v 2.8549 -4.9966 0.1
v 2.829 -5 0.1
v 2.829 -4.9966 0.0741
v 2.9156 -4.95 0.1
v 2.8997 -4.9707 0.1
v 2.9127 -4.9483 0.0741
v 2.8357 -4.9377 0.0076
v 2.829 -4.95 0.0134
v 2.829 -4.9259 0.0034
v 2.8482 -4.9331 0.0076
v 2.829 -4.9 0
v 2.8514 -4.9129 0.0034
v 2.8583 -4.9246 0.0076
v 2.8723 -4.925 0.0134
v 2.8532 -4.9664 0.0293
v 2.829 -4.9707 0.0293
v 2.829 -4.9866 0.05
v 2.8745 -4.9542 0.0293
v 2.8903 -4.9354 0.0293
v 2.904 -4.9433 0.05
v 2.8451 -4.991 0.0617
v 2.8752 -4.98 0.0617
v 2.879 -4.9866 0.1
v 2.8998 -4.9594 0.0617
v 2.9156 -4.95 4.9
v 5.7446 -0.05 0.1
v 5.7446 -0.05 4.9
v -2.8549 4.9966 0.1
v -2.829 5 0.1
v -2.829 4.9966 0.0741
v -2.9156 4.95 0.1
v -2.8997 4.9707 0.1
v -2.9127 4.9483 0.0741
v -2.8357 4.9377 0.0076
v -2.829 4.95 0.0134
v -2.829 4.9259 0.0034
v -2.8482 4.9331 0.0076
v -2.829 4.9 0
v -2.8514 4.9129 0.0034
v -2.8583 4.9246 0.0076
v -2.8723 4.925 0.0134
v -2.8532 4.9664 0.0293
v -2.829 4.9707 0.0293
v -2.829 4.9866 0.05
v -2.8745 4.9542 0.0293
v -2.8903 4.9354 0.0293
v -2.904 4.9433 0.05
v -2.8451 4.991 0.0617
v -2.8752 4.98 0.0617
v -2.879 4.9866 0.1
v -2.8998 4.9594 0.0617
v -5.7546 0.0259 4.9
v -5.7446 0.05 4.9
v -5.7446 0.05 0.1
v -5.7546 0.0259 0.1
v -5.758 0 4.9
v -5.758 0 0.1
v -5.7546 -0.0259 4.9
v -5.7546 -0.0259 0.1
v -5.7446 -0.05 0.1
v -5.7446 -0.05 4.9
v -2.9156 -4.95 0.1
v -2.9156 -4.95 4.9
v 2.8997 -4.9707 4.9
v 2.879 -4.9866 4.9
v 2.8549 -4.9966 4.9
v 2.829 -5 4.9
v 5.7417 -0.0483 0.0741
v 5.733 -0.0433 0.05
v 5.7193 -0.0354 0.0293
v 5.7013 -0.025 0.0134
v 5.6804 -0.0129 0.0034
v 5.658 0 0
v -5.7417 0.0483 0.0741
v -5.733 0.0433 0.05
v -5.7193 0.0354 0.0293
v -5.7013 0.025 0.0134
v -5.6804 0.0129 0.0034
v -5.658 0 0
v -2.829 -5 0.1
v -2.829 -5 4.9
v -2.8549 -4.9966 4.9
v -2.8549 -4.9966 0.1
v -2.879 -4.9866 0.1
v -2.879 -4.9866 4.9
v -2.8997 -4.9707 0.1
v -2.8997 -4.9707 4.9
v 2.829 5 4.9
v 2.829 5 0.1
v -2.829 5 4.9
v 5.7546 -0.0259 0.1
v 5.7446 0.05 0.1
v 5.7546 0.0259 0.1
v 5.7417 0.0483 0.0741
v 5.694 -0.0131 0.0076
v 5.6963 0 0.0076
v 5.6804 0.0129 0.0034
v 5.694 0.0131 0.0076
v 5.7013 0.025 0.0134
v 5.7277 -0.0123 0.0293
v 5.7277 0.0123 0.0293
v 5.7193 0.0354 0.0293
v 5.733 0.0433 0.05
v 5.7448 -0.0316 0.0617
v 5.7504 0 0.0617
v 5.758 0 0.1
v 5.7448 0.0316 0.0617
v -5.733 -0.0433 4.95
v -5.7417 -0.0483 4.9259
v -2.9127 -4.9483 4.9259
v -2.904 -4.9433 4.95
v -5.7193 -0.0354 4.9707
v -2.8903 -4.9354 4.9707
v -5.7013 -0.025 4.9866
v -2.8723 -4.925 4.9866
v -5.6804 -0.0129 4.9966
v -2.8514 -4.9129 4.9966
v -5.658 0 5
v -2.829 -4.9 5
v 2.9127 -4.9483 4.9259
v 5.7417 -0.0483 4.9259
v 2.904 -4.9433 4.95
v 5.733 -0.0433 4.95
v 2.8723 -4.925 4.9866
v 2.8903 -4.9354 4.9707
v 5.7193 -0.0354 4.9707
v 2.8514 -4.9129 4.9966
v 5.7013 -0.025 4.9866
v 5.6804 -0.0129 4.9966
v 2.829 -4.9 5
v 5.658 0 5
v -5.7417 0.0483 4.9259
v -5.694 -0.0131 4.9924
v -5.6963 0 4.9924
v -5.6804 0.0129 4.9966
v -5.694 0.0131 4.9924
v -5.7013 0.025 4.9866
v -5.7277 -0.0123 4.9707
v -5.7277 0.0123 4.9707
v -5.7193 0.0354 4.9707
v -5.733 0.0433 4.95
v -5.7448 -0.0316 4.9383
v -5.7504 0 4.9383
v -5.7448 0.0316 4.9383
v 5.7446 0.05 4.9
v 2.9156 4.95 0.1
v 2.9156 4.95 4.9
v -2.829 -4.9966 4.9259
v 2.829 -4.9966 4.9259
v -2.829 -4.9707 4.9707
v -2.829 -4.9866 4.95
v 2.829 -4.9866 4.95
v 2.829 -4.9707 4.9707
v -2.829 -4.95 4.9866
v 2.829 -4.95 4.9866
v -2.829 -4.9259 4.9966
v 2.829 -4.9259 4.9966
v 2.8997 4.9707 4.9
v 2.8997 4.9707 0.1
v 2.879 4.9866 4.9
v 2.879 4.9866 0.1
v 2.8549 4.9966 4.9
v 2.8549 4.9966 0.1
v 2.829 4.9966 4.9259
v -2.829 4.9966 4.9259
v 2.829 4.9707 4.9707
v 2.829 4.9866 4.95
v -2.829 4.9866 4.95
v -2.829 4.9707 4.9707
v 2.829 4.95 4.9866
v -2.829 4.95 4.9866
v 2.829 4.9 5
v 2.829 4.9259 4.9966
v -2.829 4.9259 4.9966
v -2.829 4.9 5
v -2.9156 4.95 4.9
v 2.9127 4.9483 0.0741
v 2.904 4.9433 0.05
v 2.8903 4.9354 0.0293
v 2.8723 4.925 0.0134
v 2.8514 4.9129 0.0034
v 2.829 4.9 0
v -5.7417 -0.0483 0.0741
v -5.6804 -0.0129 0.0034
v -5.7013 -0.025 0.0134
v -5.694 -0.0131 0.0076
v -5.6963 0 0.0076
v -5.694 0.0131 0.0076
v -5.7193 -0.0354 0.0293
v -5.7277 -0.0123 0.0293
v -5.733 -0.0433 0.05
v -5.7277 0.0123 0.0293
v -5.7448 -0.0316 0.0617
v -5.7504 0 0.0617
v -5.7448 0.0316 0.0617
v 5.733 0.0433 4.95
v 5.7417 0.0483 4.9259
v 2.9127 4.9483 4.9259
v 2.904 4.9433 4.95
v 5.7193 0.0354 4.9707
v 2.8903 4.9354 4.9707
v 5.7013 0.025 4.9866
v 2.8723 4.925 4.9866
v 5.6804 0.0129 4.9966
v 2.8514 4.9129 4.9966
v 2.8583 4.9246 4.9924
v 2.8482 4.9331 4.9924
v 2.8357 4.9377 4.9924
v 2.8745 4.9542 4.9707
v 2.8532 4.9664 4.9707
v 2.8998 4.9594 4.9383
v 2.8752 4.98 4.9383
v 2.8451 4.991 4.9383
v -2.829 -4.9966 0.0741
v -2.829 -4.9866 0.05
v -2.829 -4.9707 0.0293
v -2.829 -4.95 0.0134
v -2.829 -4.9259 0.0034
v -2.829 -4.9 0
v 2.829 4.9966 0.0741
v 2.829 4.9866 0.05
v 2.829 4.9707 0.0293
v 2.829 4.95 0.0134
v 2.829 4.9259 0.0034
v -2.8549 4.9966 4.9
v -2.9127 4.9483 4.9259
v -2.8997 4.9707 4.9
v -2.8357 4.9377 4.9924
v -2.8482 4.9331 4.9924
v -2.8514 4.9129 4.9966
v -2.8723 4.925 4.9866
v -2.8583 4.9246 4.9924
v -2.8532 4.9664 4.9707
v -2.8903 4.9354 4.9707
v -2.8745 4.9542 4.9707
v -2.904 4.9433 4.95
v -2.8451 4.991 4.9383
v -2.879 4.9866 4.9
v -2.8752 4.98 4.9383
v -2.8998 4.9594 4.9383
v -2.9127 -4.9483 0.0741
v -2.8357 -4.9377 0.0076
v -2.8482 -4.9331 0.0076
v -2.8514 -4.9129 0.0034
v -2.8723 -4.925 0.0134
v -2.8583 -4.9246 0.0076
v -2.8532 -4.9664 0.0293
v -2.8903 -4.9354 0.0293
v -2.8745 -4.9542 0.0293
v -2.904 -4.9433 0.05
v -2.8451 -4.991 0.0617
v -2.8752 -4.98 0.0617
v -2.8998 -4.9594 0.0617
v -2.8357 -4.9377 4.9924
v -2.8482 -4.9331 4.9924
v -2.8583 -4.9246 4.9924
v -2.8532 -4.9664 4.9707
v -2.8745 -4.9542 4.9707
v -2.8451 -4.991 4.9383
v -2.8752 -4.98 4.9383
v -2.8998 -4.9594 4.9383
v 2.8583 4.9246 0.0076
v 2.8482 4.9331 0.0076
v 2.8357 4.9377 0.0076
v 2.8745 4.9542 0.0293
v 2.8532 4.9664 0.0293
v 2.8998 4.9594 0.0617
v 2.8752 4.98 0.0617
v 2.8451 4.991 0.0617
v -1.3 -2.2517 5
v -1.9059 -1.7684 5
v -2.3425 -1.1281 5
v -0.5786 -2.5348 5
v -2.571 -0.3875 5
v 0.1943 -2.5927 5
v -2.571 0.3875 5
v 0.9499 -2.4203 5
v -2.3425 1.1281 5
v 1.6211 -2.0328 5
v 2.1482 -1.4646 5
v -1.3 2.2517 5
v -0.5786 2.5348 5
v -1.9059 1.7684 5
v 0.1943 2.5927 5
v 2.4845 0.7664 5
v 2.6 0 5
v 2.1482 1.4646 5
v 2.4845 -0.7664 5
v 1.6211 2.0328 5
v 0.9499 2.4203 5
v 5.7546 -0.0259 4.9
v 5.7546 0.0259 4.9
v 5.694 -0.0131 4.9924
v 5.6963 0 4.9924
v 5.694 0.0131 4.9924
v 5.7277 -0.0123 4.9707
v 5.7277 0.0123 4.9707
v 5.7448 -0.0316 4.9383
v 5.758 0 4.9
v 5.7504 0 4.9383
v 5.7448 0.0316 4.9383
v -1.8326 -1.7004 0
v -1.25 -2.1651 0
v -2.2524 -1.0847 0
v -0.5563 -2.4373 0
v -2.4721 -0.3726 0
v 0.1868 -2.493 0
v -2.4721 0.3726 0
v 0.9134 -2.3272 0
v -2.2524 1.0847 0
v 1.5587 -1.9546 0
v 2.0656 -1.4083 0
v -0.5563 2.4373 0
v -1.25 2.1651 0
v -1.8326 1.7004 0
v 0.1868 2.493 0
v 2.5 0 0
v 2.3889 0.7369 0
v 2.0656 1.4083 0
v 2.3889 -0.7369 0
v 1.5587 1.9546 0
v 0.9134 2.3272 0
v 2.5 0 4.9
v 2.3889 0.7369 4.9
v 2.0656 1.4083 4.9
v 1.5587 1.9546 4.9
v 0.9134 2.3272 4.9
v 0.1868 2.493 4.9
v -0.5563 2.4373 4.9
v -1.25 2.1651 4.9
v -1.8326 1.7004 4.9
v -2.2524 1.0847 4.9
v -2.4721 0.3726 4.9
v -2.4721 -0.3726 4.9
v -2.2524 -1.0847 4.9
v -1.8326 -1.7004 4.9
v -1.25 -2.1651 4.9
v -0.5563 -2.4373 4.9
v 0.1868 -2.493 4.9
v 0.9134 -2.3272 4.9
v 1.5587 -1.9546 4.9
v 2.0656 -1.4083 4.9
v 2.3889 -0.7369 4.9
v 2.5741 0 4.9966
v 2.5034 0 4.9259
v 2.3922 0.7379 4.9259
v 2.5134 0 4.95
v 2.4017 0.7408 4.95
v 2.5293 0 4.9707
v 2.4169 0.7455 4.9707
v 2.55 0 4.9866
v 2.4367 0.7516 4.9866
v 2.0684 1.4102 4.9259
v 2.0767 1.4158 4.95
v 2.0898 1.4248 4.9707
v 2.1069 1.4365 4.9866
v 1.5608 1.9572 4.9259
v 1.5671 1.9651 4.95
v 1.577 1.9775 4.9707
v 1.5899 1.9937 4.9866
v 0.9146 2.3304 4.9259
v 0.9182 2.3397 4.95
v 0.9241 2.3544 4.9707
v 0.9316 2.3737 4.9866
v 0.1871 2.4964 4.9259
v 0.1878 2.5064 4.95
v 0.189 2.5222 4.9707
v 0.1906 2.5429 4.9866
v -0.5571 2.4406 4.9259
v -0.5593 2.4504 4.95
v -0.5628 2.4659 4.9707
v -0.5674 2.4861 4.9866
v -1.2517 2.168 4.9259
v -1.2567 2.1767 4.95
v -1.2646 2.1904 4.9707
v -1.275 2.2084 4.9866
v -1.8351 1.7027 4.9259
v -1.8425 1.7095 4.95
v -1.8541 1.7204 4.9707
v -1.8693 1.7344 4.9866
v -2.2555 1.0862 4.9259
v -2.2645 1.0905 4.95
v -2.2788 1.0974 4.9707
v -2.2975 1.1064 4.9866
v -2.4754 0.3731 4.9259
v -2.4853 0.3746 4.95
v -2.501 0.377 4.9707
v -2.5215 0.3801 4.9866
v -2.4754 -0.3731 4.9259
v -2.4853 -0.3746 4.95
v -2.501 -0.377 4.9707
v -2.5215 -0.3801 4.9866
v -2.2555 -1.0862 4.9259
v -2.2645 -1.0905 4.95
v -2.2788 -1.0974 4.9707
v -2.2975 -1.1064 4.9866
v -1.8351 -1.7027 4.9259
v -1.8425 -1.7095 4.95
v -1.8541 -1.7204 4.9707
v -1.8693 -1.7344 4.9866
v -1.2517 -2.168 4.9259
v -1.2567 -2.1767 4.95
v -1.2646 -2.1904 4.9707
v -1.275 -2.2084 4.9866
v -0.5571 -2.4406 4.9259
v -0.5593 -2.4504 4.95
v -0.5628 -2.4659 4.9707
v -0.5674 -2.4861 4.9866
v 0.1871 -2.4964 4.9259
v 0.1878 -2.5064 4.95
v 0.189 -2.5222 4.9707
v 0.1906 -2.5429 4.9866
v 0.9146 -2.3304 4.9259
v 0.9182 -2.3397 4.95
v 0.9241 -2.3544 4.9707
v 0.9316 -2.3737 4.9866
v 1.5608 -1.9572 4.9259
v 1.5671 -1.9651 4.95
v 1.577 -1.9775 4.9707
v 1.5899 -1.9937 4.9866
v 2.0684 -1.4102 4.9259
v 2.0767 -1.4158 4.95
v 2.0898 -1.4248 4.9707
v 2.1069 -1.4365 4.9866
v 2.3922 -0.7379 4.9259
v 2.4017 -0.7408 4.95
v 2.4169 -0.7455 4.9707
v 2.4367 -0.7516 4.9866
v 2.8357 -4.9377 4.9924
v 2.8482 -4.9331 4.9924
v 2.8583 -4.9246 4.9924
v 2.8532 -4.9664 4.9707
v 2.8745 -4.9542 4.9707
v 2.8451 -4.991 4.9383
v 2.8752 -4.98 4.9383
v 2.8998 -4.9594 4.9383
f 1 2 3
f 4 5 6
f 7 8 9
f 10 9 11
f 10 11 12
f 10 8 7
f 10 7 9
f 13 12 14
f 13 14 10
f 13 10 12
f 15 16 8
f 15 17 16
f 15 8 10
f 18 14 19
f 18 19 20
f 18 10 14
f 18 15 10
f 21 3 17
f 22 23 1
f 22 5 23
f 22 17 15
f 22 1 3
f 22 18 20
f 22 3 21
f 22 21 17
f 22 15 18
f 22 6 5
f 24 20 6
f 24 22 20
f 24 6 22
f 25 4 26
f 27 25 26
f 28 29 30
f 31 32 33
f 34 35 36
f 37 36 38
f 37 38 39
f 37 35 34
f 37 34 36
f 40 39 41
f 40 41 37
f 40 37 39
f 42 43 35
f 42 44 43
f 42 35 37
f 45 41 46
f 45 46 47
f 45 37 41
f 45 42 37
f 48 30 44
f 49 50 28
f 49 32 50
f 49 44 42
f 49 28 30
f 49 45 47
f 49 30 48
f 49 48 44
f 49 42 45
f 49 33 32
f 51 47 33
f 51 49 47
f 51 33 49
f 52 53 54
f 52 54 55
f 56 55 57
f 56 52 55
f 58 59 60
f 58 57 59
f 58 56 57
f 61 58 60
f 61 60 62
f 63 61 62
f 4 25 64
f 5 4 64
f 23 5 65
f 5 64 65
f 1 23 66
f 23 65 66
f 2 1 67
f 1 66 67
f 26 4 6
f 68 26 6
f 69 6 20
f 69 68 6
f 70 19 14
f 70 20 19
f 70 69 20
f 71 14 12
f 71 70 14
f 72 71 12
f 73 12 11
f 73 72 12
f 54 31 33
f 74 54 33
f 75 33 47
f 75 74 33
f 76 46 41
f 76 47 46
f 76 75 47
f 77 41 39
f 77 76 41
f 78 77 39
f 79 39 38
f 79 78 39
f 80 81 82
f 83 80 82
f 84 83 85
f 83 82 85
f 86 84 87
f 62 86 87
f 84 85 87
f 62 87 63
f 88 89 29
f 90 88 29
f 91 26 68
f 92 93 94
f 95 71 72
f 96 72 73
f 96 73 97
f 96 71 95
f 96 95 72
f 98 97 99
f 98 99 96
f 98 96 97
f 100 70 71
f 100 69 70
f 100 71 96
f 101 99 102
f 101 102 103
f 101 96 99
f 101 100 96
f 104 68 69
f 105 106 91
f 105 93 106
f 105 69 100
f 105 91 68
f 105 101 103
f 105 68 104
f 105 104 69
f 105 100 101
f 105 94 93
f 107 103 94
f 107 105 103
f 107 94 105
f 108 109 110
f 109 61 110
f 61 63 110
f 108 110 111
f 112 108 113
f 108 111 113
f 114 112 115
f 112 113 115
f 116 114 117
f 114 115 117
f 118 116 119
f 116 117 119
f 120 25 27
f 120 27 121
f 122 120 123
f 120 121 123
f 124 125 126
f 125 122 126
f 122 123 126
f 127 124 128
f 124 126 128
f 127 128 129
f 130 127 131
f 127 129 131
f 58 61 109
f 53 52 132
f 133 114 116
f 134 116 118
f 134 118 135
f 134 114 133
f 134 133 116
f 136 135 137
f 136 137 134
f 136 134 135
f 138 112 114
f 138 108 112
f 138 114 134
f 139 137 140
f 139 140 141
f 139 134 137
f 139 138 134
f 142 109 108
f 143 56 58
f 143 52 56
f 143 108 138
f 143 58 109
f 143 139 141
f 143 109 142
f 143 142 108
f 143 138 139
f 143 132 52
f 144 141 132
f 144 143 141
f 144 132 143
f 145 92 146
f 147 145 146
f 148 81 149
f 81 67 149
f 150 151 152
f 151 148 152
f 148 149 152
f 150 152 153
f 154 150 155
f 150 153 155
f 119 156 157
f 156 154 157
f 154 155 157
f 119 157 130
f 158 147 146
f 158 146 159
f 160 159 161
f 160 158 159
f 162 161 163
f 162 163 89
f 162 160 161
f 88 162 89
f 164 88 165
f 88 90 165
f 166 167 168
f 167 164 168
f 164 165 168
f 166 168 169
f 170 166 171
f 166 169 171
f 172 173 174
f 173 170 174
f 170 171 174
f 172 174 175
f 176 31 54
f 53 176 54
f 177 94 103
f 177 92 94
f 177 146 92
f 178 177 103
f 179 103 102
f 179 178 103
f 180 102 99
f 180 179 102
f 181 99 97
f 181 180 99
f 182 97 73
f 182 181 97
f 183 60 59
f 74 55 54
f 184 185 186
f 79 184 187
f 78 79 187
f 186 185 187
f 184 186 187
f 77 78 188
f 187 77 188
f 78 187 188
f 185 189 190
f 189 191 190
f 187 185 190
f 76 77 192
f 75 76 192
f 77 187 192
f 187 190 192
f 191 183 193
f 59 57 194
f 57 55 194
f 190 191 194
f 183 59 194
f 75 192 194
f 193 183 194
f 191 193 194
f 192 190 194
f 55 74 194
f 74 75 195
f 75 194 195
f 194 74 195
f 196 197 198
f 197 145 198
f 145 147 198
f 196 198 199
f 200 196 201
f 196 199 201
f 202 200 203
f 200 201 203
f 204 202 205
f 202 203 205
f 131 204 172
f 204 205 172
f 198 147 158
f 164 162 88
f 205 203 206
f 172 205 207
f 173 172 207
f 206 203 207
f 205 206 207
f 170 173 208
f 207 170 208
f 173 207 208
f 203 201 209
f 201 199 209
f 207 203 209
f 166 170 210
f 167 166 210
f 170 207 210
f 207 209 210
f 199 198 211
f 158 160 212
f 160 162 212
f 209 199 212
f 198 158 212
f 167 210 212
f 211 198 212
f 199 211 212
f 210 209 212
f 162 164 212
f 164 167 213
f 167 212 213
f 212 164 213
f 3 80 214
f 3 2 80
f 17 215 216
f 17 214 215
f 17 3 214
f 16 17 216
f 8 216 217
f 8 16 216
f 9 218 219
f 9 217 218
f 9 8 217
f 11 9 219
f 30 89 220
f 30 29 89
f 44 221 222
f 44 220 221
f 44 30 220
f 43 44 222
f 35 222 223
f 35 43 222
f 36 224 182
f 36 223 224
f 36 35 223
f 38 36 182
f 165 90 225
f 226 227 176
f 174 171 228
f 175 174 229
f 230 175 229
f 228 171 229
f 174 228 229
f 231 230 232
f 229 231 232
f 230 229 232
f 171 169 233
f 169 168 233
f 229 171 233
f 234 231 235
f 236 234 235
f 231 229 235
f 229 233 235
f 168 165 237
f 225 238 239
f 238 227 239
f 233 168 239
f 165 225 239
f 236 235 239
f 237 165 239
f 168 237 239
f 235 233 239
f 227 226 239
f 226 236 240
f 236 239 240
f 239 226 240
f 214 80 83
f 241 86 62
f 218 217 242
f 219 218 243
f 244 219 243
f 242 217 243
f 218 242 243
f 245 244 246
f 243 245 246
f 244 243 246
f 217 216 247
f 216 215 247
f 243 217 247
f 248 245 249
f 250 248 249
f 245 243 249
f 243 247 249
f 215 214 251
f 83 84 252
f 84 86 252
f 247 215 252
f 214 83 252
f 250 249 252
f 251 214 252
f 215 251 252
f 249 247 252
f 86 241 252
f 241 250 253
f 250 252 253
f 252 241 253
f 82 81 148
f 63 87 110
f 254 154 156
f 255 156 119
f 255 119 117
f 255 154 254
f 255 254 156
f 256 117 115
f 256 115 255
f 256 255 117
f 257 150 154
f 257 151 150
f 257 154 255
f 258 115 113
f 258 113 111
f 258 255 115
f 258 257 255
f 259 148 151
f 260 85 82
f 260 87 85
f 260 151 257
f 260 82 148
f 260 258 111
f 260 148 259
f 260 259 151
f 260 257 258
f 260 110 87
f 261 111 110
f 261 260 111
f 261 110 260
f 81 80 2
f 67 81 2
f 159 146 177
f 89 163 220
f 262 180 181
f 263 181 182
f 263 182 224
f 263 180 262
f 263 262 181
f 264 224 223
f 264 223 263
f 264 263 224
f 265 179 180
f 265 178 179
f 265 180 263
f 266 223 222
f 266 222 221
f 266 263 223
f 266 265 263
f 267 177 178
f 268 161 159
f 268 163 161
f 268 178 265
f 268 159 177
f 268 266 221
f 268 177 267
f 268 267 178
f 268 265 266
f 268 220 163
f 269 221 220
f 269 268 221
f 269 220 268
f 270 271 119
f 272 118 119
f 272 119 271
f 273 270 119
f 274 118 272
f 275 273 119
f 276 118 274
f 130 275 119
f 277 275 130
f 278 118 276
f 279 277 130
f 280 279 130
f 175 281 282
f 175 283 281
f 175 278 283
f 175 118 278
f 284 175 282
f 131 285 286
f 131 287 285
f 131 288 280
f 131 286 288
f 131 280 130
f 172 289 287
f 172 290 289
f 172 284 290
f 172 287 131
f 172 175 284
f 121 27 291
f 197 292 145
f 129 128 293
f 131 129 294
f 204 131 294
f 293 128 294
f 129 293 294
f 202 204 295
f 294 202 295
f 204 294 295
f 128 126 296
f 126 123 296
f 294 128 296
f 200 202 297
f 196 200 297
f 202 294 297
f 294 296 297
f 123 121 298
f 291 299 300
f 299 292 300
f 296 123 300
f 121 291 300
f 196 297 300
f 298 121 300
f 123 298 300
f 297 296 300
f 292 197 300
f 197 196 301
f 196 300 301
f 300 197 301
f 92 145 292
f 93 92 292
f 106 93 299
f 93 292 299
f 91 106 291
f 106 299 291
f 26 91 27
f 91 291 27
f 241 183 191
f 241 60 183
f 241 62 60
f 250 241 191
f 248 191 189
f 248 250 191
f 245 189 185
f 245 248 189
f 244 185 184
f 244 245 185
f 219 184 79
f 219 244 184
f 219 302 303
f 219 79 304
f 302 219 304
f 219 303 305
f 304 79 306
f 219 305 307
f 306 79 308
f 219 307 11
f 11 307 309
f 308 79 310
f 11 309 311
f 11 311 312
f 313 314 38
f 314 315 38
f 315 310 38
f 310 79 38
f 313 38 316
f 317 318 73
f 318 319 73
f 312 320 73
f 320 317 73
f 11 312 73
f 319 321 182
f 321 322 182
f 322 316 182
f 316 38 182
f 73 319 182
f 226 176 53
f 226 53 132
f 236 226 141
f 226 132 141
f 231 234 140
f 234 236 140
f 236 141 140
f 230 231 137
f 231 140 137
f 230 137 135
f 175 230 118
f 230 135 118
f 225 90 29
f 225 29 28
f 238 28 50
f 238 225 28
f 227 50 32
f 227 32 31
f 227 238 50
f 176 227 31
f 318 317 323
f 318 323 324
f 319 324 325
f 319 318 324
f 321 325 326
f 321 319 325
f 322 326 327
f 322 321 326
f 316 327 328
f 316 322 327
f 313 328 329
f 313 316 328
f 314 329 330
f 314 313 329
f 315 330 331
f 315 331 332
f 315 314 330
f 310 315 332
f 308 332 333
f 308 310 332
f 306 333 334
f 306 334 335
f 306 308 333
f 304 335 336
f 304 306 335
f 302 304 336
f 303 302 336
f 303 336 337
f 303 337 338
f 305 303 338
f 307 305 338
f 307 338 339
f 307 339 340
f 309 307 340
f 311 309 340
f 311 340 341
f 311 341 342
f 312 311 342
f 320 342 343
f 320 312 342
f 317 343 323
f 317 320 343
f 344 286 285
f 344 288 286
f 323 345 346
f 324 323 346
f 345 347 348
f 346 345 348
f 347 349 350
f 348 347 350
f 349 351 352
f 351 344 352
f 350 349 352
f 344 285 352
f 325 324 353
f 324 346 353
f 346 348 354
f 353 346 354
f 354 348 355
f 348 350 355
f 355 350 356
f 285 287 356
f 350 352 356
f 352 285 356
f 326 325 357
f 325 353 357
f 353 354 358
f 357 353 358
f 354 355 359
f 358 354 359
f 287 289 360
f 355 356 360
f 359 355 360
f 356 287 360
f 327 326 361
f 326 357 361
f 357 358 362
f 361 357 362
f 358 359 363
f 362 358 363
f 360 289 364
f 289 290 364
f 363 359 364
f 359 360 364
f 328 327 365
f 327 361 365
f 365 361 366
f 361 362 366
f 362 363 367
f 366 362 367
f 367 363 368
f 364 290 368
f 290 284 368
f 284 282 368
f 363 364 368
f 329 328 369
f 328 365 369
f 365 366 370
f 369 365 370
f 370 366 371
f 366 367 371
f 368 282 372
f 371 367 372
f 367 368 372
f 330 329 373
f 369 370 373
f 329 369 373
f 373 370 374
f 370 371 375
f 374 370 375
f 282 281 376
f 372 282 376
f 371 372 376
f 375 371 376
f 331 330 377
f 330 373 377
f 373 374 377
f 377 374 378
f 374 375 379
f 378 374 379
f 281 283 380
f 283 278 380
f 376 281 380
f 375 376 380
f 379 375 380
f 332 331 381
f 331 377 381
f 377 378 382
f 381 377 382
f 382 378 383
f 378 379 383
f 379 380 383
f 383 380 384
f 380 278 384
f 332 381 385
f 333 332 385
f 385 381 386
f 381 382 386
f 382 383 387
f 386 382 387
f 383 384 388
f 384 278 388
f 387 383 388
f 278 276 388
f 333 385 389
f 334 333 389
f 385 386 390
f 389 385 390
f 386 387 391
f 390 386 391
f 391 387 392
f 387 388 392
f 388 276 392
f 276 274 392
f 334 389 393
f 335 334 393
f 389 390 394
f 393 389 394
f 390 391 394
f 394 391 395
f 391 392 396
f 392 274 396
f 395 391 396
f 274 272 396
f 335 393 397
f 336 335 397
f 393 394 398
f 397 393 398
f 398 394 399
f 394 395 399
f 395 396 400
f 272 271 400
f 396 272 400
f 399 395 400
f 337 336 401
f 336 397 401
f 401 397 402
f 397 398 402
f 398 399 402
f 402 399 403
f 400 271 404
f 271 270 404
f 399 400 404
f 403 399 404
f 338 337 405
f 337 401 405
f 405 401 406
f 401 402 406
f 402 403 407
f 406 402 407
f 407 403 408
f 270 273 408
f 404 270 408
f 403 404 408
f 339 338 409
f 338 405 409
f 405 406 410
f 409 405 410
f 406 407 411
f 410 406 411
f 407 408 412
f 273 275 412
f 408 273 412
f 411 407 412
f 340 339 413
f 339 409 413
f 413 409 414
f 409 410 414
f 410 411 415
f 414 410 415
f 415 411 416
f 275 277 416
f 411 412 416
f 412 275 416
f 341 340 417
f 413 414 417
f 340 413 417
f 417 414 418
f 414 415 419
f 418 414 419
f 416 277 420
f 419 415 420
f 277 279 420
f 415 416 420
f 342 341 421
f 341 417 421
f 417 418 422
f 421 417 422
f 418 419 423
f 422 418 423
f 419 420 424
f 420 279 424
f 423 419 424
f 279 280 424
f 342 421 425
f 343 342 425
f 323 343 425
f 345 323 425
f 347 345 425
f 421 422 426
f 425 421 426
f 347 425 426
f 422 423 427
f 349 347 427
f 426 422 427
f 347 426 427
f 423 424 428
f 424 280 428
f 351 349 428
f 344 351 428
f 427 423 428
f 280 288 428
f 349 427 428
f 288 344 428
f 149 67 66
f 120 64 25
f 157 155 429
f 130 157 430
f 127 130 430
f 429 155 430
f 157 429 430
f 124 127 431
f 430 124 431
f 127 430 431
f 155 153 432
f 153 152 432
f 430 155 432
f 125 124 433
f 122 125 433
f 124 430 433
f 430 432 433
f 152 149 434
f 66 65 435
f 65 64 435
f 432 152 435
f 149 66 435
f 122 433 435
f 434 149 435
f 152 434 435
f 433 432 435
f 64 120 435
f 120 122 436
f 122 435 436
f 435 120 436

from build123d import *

# Parameters (mm, degrees)
F0_R     = 2.5
F1_DEPTH = 5
F2_R     = 0.1


with BuildPart() as f1:
    # F0 (on Top) → F1 (new body)
    with BuildSketch(Plane.XY):
        Polygon((5.773503, 0), (2.886751, 5), (-2.886751, 5), (-5.773503, 0), (-2.886751, -5), (2.886751, -5), align=None)
        Circle(F0_R, mode=Mode.SUBTRACT)
    extrude(amount=F1_DEPTH)

    # F2
    f2_edges = [f1.edges().sort_by_distance(p)[0] for p in [
        (-2.886751, -5, 2.5),
        (2.886751, -5, 2.5),
        (0, -5, 0),
        (0, -5, 5),
        (-5.773503, 0, 2.5),
        (-4.330127, -2.5, 0),
        (-4.330127, -2.5, 5),
        (5.773503, 0, 2.5),
        (4.330127, -2.5, 0),
        (4.330127, -2.5, 5),
        (2.886751, 5, 2.5),
        (4.330127, 2.5, 0),
        (4.330127, 2.5, 5),
        (-2.886751, 5, 2.5),
        (0, 5, 0),
        (0, 5, 5),
        (-4.330127, 2.5, 0),
        (-4.330127, 2.5, 5),
        (-2.5, 0, 5),
    ]]
    fillet(f2_edges, radius=F2_R)


solid = f1.part
